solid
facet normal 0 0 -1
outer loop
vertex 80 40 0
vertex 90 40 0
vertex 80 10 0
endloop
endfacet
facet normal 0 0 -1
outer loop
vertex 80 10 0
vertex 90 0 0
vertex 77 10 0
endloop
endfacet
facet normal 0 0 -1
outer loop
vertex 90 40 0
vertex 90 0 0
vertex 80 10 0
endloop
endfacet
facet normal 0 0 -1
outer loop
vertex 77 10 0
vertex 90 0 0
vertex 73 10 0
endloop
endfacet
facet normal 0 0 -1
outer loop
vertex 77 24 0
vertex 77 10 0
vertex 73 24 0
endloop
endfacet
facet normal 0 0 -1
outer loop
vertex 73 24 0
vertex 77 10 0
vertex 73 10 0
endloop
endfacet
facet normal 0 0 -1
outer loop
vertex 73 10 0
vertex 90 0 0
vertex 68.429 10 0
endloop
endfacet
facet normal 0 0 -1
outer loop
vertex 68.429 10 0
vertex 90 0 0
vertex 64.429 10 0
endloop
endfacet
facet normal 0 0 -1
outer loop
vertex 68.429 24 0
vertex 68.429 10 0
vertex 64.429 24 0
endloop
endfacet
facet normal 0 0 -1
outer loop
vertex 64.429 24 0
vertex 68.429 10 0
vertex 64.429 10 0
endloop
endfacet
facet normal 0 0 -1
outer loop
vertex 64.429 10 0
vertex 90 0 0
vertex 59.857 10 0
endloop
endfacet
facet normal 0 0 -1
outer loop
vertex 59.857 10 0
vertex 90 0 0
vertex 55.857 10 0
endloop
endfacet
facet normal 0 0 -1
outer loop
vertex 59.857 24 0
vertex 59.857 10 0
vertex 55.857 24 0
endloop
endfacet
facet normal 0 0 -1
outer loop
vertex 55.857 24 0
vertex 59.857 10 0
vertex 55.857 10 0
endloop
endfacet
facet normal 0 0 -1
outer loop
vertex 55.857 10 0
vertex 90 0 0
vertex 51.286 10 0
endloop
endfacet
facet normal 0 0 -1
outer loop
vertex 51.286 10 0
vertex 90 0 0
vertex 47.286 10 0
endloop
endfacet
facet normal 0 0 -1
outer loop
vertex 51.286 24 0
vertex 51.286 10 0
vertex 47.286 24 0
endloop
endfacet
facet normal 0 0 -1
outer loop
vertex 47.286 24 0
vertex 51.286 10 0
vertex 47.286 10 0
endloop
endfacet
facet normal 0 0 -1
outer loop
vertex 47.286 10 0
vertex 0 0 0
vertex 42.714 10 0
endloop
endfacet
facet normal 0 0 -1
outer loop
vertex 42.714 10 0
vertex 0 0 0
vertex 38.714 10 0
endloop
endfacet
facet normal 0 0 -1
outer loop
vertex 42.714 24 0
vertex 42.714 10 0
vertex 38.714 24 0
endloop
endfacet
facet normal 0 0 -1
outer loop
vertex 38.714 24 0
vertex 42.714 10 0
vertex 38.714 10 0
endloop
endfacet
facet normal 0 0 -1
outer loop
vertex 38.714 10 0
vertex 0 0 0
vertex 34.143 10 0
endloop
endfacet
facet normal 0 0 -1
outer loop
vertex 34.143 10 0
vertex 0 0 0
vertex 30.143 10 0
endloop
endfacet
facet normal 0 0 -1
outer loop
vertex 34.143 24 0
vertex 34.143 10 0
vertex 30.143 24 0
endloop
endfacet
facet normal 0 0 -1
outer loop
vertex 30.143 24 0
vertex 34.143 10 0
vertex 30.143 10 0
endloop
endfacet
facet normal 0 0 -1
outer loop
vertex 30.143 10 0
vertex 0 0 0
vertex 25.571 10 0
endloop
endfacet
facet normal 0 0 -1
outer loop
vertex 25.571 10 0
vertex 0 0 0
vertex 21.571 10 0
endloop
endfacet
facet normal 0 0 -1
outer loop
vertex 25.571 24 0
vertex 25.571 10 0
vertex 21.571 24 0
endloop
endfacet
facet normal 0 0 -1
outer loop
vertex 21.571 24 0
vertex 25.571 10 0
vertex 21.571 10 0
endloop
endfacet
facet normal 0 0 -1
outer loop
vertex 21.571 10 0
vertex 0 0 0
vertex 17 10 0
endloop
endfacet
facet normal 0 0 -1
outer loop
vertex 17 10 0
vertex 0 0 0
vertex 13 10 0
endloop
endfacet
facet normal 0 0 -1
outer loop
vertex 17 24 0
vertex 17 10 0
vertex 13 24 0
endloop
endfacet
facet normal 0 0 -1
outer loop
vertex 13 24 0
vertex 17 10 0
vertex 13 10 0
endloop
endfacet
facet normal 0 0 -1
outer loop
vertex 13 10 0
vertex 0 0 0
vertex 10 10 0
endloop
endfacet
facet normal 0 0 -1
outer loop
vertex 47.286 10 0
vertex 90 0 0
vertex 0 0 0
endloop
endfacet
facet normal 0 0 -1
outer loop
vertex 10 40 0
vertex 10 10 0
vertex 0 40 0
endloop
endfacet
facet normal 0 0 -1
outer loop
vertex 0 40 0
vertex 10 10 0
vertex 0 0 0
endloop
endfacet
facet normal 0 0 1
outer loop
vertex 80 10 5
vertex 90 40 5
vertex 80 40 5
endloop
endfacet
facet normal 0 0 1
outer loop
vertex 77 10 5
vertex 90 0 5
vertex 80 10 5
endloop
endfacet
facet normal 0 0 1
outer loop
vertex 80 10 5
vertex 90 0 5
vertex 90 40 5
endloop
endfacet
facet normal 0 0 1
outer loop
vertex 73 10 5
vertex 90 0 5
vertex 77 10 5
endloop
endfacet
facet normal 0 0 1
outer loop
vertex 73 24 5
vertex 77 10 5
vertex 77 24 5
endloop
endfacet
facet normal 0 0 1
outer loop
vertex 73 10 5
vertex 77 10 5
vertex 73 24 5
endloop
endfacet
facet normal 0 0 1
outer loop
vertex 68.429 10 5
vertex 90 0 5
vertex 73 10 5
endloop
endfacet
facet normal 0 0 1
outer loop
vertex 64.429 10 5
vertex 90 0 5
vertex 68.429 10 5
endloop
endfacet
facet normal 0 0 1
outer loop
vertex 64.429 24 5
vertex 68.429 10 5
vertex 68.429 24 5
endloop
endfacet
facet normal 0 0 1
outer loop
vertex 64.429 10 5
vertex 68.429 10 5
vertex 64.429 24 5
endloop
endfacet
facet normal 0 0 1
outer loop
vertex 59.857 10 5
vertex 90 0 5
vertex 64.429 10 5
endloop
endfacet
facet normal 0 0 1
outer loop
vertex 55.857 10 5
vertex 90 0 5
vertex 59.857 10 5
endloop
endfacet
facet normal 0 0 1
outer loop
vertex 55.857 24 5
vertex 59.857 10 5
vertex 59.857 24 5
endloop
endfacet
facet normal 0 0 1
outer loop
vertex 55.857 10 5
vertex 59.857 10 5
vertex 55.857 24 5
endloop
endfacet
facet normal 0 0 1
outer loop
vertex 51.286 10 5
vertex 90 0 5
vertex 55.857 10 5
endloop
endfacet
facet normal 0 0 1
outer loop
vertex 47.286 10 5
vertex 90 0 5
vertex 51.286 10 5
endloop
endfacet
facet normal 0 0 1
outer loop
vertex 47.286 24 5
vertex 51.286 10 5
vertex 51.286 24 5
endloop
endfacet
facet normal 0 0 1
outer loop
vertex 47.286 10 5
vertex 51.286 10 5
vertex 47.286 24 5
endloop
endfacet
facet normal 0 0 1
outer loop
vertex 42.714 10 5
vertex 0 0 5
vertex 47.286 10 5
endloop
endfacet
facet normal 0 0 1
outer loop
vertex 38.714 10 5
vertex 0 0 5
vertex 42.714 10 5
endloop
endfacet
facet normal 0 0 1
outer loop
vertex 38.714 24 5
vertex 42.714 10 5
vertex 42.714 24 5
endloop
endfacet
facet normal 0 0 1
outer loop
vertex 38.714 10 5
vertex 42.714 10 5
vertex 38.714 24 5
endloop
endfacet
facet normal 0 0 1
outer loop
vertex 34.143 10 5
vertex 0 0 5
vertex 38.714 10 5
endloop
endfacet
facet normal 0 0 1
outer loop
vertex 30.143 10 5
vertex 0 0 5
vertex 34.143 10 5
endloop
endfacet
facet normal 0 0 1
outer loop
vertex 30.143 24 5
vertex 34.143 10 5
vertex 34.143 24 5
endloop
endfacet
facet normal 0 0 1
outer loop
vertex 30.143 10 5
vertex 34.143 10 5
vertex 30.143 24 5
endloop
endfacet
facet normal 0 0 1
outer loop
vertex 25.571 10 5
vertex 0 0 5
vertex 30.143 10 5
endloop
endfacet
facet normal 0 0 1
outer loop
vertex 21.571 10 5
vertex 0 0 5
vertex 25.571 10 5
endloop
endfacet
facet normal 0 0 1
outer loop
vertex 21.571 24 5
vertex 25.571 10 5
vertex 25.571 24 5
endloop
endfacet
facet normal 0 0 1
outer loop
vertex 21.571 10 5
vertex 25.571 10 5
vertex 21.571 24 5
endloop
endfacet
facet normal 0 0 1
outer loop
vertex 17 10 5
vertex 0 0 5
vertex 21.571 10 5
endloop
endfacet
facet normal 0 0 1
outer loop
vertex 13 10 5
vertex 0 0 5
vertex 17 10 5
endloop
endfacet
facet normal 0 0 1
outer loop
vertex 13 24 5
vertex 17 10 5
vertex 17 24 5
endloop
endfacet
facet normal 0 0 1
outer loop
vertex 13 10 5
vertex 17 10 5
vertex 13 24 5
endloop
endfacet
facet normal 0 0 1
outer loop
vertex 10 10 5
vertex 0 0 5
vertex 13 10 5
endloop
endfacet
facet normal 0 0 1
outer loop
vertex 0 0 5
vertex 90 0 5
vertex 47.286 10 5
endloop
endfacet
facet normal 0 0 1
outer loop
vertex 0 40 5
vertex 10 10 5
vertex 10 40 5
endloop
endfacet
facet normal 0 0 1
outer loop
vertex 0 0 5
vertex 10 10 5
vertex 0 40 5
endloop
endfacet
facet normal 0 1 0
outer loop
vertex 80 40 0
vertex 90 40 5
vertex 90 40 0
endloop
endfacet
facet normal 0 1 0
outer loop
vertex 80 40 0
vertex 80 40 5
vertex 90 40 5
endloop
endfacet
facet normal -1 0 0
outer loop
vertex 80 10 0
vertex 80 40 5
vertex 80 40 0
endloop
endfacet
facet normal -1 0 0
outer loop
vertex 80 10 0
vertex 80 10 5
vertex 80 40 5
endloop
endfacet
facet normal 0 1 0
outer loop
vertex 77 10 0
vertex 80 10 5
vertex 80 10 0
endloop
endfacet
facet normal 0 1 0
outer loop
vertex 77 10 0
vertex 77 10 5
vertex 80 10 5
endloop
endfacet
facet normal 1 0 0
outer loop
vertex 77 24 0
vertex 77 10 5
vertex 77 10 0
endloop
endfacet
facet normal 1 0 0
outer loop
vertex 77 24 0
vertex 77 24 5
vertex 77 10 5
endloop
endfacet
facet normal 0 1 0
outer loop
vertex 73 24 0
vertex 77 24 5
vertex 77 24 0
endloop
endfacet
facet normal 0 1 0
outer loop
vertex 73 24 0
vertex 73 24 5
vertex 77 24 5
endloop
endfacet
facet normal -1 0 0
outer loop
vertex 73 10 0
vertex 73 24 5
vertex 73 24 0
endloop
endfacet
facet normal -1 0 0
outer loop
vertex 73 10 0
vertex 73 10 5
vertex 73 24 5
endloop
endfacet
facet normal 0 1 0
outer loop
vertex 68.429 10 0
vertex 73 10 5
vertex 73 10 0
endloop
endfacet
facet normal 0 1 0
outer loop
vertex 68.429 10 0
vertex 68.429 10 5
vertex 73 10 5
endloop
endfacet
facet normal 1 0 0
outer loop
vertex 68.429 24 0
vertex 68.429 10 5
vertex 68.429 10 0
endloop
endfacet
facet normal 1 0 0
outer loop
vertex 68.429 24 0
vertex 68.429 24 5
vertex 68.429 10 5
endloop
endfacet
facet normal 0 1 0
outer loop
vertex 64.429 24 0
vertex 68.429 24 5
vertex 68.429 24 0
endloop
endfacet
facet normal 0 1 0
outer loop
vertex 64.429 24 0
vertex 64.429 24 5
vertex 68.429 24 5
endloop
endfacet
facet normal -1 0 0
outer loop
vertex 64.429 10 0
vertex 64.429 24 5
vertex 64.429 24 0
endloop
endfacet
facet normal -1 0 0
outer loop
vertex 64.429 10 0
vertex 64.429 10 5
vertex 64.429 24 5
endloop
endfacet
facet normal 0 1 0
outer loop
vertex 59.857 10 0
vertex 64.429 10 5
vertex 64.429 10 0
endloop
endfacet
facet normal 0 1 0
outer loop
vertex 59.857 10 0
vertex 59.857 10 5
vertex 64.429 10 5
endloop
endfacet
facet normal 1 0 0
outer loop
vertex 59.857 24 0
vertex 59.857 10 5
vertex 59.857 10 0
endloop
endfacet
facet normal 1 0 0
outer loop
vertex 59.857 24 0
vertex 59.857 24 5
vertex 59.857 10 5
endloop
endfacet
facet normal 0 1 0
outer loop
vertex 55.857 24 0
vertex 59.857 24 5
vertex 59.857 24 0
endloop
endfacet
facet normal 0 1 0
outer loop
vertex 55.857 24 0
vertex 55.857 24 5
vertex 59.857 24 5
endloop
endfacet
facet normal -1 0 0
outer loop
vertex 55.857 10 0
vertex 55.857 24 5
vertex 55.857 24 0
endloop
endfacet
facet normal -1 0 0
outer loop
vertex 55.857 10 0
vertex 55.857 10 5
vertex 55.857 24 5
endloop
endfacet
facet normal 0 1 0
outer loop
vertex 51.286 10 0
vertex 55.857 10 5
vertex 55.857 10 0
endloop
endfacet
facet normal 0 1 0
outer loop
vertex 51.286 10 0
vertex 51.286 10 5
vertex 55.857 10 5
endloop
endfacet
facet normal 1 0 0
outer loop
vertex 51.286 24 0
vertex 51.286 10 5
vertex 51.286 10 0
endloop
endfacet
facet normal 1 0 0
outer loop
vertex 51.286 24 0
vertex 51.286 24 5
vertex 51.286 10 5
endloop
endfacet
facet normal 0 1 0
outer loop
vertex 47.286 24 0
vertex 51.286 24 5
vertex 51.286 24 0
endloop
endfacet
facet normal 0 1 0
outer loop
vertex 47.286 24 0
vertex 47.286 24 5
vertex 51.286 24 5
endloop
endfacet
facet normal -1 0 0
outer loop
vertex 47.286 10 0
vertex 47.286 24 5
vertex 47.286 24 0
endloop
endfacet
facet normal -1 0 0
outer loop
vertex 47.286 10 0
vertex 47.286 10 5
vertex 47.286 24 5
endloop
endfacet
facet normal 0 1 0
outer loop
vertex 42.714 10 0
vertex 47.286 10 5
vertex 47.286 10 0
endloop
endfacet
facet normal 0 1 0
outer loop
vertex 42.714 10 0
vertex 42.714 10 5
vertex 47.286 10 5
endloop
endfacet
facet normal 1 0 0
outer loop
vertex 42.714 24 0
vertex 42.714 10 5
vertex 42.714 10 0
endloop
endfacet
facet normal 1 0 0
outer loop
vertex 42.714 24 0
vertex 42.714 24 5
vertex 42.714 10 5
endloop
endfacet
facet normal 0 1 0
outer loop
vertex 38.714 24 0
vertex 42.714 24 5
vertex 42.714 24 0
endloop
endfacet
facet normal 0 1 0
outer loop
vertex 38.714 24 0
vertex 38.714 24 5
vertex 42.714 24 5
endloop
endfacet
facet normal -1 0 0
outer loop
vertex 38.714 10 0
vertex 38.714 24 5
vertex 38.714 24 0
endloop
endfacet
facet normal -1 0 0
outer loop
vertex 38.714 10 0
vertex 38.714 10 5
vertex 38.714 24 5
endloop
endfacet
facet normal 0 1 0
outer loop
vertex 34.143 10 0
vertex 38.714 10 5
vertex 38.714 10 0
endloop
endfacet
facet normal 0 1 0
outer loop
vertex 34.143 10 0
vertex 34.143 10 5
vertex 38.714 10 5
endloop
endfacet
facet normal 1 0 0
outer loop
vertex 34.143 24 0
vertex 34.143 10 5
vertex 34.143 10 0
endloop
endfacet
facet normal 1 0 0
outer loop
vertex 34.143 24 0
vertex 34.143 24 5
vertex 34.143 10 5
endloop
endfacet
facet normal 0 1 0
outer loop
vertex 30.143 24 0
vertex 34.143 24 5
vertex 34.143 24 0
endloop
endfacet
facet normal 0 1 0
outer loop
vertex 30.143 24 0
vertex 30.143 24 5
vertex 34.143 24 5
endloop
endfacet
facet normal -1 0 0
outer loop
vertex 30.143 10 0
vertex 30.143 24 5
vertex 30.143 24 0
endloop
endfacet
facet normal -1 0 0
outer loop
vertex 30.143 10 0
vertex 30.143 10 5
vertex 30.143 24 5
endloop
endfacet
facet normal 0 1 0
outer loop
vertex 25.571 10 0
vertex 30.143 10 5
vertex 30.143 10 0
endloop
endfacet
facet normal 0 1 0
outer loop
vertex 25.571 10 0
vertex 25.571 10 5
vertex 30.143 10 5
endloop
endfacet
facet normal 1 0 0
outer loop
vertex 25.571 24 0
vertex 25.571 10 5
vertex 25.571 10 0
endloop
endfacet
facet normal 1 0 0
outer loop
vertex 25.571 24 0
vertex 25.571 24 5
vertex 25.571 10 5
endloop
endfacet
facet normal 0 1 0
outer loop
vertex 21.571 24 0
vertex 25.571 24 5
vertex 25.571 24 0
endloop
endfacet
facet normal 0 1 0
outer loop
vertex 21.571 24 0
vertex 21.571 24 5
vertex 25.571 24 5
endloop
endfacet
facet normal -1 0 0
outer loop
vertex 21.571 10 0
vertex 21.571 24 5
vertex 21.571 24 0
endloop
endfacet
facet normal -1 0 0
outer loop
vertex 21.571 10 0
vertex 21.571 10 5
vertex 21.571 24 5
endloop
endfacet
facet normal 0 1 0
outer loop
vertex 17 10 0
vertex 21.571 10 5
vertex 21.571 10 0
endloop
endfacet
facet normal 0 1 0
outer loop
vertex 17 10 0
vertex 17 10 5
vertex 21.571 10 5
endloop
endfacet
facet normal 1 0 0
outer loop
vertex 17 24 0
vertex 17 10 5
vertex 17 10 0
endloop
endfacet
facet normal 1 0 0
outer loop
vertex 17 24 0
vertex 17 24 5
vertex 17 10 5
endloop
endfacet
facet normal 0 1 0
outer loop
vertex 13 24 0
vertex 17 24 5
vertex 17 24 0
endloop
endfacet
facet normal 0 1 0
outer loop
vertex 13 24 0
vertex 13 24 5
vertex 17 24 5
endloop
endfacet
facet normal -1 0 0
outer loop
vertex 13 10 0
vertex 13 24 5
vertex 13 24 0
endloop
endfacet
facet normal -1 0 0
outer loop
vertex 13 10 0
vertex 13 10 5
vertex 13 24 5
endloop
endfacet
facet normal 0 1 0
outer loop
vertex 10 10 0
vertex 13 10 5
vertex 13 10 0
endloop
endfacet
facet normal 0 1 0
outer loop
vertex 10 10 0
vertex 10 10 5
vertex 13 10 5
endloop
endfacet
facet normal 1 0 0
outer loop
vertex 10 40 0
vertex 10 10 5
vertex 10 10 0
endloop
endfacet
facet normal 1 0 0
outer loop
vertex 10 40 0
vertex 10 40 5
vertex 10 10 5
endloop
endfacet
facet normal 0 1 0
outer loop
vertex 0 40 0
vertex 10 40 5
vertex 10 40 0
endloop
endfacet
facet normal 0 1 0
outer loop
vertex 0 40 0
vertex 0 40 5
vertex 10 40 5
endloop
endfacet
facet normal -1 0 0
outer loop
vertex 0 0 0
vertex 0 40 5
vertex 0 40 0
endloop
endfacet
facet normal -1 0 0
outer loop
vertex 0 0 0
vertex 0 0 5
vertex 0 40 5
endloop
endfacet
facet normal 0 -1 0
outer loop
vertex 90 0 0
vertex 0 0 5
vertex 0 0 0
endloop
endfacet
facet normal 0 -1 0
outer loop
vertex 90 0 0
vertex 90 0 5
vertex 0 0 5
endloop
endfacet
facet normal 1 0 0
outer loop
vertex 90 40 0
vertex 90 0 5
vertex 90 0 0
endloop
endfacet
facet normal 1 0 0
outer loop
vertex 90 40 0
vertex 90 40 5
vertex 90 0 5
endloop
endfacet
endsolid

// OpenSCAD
$fn = 32;

// ----------------------------------------------------------------------
// Guard grille: 8 slats over a 90 x 40 mm plate
// ----------------------------------------------------------------------

// --- parameters (mm) ---
profile_height = 5;       // extrusion height
profile_points = 40;      // points of the closed outline

profile = [[0, 0], [90, 0], [90, 40], [80, 40], [80, 10], [77, 10], [77, 24], [73, 24], [73, 10], [68.429, 10], [68.429, 24], [64.429, 24], [64.429, 10], [59.857, 10], [59.857, 24], [55.857, 24], [55.857, 10], [51.286, 10], [51.286, 24], [47.286, 24], [47.286, 10], [42.714, 10], [42.714, 24], [38.714, 24], [38.714, 10], [34.143, 10], [34.143, 24], [30.143, 24], [30.143, 10], [25.571, 10], [25.571, 24], [21.571, 24], [21.571, 10], [17, 10], [17, 24], [13, 24], [13, 10], [10, 10], [10, 40], [0, 40]];  // single closed polygon, 40 points, counter clockwise

// --- the one profile operation ---
linear_extrude(height = profile_height) polygon(points = profile);
